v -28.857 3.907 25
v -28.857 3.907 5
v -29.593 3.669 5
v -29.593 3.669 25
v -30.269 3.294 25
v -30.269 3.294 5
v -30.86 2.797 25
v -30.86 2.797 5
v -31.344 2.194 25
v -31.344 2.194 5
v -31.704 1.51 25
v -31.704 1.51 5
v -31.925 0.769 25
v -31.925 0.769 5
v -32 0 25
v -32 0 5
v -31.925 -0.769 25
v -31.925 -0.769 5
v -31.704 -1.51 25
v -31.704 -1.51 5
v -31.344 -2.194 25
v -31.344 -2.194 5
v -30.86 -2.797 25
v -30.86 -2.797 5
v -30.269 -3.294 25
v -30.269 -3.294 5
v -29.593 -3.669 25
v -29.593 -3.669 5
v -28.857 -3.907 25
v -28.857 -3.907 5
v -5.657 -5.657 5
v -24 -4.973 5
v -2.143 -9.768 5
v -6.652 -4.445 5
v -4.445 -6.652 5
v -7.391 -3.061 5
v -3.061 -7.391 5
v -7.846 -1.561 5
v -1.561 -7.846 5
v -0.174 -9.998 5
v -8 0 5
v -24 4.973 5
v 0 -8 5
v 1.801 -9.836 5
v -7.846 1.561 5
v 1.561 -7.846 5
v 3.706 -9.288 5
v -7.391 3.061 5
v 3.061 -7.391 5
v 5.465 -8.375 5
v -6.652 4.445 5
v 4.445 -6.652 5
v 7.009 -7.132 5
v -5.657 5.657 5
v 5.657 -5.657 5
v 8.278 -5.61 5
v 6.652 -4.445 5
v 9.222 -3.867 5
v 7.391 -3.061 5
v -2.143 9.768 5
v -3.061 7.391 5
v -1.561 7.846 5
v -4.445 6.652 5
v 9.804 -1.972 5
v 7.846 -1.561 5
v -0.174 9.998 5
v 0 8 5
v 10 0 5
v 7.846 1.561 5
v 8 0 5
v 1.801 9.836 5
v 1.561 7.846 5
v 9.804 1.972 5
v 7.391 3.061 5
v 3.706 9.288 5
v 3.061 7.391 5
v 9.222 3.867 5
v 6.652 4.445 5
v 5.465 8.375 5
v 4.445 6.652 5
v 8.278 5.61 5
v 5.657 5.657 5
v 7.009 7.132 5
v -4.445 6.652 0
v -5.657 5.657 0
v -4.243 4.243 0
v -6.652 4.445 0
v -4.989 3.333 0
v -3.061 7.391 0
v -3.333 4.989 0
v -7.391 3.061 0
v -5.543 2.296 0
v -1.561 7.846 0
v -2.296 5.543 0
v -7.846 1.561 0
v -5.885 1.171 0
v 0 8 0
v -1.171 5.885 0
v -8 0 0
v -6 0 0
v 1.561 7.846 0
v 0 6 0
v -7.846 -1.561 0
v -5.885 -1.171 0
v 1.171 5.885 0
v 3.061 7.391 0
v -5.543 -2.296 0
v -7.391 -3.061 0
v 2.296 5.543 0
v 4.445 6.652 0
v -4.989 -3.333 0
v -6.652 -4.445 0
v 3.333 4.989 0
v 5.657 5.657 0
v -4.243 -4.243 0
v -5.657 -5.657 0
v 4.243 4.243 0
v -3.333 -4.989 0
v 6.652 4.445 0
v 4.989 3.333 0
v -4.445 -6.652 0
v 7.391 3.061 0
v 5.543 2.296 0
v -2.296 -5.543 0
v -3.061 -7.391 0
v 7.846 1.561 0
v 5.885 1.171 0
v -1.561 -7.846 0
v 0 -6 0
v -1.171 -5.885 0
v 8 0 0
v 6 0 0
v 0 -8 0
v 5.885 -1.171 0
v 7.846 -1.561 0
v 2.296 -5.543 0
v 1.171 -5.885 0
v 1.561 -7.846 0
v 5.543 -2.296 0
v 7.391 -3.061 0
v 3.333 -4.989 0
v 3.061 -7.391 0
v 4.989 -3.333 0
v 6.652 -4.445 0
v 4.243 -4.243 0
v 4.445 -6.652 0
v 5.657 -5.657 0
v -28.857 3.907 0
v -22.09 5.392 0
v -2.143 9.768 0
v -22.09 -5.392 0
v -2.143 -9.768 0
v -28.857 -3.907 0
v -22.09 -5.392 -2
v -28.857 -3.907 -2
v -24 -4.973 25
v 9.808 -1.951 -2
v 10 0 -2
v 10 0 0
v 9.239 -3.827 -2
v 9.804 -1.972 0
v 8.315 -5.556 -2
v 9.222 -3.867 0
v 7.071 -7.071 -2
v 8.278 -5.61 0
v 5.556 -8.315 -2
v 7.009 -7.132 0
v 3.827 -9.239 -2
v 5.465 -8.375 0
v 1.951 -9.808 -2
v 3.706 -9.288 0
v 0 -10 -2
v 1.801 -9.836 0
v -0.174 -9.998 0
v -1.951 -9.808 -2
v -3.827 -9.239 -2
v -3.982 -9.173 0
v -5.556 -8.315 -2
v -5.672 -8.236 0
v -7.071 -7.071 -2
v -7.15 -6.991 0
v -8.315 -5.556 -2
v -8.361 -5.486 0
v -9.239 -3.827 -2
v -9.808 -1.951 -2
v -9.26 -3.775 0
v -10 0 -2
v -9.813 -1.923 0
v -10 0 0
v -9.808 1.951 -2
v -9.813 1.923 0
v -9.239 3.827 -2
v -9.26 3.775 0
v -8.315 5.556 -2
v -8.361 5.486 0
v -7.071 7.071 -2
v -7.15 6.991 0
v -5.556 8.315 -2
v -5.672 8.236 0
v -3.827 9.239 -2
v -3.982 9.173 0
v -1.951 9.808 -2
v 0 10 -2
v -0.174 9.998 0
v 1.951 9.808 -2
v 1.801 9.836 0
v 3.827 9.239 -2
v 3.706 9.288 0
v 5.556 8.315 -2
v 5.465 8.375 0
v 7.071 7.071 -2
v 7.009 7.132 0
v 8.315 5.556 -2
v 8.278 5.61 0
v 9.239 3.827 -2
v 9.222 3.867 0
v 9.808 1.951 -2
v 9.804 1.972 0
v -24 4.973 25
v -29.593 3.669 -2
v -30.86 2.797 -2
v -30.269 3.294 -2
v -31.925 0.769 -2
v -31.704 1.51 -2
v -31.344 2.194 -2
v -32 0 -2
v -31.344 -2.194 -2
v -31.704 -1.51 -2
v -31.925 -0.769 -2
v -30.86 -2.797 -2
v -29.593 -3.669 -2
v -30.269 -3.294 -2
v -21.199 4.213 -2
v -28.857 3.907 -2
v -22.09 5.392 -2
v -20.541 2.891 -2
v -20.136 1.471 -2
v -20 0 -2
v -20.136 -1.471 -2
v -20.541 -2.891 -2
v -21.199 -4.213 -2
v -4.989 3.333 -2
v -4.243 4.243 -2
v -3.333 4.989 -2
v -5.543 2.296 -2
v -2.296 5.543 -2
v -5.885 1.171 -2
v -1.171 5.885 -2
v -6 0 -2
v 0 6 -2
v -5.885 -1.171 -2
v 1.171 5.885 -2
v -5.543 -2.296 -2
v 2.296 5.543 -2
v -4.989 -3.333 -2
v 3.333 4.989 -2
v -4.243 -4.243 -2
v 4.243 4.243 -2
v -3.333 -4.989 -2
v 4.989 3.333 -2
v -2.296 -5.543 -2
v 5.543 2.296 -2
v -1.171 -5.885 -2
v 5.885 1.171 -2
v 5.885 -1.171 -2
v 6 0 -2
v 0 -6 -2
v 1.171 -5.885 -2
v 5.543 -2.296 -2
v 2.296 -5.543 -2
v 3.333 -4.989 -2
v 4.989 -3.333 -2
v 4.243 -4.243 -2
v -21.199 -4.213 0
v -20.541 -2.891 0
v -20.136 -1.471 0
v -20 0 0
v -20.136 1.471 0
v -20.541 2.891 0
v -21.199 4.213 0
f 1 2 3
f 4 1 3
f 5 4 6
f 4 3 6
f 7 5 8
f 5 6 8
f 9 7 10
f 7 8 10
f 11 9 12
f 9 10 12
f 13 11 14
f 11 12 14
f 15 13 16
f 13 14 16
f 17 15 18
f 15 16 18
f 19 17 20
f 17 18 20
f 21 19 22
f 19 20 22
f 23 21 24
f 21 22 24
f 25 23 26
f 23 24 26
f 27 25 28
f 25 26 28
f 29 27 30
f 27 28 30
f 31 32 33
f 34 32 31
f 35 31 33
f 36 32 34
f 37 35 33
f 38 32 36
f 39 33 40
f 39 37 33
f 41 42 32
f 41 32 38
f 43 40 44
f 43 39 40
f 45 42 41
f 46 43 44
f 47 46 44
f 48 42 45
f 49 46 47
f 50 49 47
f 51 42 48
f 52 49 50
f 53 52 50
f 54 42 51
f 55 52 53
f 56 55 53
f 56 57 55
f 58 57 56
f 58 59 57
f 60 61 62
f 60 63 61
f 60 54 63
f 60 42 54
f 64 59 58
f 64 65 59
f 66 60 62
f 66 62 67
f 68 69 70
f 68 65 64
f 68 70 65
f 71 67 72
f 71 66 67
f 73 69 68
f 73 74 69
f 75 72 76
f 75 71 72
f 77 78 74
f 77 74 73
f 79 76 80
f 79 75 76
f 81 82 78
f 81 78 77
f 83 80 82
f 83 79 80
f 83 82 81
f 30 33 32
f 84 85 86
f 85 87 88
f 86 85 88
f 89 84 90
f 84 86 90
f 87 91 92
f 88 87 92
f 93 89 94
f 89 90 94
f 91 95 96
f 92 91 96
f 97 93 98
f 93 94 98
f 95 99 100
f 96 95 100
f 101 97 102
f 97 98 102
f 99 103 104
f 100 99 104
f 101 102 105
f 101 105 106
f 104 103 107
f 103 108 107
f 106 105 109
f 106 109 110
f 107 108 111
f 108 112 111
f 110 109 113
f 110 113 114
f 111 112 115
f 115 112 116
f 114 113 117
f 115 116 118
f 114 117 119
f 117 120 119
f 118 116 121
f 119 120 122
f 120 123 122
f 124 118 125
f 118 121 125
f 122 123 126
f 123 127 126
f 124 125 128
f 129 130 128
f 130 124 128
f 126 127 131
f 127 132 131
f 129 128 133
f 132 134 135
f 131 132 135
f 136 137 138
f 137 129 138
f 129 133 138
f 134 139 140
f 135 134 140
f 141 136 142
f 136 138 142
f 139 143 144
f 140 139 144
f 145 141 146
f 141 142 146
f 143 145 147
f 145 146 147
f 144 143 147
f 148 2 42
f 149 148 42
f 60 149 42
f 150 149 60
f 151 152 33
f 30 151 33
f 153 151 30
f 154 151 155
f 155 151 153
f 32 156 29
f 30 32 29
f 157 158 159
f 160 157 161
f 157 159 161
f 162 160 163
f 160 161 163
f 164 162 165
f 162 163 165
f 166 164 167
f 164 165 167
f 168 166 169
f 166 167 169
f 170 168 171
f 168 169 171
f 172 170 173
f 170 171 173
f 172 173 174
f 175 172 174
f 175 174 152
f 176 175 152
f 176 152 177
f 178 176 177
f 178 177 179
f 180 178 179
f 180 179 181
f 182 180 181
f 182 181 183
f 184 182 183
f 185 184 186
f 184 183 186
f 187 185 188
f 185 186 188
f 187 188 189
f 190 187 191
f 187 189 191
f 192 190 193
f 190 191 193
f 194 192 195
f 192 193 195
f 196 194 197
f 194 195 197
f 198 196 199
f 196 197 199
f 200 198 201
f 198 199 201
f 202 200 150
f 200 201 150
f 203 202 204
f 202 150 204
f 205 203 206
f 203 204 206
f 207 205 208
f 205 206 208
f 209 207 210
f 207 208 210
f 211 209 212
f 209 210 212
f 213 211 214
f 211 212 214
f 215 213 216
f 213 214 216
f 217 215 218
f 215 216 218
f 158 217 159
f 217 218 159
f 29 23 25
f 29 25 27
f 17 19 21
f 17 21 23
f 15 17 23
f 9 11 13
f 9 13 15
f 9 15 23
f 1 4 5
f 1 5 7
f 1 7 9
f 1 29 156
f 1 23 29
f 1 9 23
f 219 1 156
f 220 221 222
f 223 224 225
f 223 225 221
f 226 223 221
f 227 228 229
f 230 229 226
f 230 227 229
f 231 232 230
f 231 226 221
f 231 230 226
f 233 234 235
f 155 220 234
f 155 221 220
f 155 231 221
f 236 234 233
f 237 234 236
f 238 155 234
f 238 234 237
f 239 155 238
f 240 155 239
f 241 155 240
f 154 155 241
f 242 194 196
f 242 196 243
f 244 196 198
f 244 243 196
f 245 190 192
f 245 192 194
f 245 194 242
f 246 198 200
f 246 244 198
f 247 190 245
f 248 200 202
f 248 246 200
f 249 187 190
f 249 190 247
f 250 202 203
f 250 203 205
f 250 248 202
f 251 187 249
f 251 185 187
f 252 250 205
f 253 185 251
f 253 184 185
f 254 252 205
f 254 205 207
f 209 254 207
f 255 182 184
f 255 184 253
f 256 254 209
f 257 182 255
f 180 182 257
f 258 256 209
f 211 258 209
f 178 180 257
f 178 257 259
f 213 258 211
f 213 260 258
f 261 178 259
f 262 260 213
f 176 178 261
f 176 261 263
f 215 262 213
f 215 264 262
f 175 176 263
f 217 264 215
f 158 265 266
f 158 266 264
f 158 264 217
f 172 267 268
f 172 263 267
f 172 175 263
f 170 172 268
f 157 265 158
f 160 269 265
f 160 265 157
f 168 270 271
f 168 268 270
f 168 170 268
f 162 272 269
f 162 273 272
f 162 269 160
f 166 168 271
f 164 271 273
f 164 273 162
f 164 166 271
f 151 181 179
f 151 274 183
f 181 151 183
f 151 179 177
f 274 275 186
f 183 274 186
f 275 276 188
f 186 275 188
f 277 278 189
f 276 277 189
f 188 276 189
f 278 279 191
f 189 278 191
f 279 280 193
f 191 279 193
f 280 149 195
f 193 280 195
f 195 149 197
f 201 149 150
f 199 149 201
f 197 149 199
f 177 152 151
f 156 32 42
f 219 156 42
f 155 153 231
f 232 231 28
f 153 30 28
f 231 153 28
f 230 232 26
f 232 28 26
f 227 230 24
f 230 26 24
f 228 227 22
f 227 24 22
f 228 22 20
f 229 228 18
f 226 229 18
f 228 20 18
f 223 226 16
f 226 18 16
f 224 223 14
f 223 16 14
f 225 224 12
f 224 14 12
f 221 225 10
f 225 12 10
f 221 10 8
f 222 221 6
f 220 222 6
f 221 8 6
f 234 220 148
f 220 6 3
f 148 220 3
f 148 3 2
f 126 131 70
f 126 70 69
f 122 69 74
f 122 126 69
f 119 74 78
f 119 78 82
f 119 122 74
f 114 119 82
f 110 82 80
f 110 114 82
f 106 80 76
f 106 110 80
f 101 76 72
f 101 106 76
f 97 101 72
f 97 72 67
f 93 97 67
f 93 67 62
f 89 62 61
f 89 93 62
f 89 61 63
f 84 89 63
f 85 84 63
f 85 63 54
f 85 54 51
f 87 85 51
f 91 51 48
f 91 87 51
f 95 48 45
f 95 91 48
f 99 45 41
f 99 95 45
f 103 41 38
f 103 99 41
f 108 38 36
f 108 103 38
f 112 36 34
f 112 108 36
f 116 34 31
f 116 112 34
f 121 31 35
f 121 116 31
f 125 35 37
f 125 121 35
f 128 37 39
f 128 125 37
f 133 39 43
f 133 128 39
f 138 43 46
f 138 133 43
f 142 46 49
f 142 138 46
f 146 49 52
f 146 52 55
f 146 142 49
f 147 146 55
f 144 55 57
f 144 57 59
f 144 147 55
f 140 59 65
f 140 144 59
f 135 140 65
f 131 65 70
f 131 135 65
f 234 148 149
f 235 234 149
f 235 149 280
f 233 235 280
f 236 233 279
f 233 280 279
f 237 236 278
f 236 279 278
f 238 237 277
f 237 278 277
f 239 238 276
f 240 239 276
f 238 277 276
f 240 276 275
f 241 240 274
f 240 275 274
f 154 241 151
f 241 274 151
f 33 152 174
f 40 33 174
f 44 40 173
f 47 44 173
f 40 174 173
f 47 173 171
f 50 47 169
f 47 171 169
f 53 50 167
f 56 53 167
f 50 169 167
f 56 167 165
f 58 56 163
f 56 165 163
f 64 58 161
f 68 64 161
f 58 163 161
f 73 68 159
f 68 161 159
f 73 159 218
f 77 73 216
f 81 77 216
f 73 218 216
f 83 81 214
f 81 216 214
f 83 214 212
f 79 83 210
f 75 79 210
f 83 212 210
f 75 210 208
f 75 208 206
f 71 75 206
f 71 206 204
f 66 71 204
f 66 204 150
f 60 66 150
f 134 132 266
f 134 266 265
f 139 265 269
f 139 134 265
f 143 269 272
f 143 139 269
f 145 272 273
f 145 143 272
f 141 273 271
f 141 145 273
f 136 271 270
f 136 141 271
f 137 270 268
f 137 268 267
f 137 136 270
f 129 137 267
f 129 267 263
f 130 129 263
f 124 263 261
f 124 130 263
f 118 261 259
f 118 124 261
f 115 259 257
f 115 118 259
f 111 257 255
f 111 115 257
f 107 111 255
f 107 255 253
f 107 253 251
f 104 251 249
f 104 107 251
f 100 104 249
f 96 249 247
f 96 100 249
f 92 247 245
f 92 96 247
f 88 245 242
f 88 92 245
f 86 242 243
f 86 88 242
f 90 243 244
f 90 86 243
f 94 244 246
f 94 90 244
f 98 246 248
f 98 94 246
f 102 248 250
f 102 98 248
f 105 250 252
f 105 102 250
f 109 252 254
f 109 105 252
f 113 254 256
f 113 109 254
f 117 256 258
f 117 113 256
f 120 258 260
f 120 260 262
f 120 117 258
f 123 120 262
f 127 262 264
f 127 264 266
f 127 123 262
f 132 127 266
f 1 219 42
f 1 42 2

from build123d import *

# Parameters (mm, degrees)
SKETCH_R      = 8
PAD_DEPTH     = 5
PAD001_DEPTH  = 20
SKETCH002_R   = 10
SKETCH002_R_2 = 6
PAD002_DEPTH  = 2
PAD003_DEPTH  = 2


with BuildPart() as part:
    # Sketch → Pad (new body)
    with BuildSketch(Plane.XY):
        with BuildLine():
            ThreePointArc((-2.142857, -9.76771), (10, 0), (-2.142857, 9.76771))
            Line((-28.857143, 3.907084), (-2.142857, 9.76771))
            ThreePointArc((-28.857143, 3.907084), (-32, 0), (-28.857143, -3.907084))
            Line((-2.142857, -9.76771), (-28.857143, -3.907084))
        make_face()
        Circle(SKETCH_R, mode=Mode.SUBTRACT)
    extrude(amount=PAD_DEPTH)

    # Sketch001 (on Face7 of Pad) → Pad001 (join)
    with BuildSketch(Plane.XY.offset(5)):
        with BuildLine():
            ThreePointArc((-28.857143, 3.907084), (-32, -1.3e-05), (-28.857117, -3.90709))
            Line((-24, -4.972619), (-28.857117, -3.90709))
            Line((-24, -4.972619), (-24, 4.972653))
            Line((-24, 4.972653), (-28.857143, 3.907084))
        make_face()
    extrude(amount=PAD001_DEPTH)

    # Sketch002 → Pad002 (join)
    with BuildSketch(Plane(origin=(0, 0, 0), x_dir=(1, 0, 0), z_dir=(0, 0, -1))):
        Circle(SKETCH002_R)
        Circle(SKETCH002_R_2, mode=Mode.SUBTRACT)
    extrude(amount=PAD002_DEPTH)

    # Sketch003 (on Face7 of Pad002) → Pad003 (join)
    with BuildSketch(Plane(origin=(0, 0, 0), x_dir=(1, 0, 0), z_dir=(0, 0, -1))):
        with BuildLine():
            ThreePointArc((-28.857143, 3.907084), (-32, 0), (-28.857143, -3.907084))
            Line((-28.857143, -3.907084), (-22.089875, -5.391699))
            ThreePointArc((-22.089875, -5.391699), (-20, 0), (-22.089875, 5.391699))
            Line((-22.089875, 5.391699), (-28.857143, 3.907084))
        make_face()
    extrude(amount=PAD003_DEPTH)


solid = part.part
